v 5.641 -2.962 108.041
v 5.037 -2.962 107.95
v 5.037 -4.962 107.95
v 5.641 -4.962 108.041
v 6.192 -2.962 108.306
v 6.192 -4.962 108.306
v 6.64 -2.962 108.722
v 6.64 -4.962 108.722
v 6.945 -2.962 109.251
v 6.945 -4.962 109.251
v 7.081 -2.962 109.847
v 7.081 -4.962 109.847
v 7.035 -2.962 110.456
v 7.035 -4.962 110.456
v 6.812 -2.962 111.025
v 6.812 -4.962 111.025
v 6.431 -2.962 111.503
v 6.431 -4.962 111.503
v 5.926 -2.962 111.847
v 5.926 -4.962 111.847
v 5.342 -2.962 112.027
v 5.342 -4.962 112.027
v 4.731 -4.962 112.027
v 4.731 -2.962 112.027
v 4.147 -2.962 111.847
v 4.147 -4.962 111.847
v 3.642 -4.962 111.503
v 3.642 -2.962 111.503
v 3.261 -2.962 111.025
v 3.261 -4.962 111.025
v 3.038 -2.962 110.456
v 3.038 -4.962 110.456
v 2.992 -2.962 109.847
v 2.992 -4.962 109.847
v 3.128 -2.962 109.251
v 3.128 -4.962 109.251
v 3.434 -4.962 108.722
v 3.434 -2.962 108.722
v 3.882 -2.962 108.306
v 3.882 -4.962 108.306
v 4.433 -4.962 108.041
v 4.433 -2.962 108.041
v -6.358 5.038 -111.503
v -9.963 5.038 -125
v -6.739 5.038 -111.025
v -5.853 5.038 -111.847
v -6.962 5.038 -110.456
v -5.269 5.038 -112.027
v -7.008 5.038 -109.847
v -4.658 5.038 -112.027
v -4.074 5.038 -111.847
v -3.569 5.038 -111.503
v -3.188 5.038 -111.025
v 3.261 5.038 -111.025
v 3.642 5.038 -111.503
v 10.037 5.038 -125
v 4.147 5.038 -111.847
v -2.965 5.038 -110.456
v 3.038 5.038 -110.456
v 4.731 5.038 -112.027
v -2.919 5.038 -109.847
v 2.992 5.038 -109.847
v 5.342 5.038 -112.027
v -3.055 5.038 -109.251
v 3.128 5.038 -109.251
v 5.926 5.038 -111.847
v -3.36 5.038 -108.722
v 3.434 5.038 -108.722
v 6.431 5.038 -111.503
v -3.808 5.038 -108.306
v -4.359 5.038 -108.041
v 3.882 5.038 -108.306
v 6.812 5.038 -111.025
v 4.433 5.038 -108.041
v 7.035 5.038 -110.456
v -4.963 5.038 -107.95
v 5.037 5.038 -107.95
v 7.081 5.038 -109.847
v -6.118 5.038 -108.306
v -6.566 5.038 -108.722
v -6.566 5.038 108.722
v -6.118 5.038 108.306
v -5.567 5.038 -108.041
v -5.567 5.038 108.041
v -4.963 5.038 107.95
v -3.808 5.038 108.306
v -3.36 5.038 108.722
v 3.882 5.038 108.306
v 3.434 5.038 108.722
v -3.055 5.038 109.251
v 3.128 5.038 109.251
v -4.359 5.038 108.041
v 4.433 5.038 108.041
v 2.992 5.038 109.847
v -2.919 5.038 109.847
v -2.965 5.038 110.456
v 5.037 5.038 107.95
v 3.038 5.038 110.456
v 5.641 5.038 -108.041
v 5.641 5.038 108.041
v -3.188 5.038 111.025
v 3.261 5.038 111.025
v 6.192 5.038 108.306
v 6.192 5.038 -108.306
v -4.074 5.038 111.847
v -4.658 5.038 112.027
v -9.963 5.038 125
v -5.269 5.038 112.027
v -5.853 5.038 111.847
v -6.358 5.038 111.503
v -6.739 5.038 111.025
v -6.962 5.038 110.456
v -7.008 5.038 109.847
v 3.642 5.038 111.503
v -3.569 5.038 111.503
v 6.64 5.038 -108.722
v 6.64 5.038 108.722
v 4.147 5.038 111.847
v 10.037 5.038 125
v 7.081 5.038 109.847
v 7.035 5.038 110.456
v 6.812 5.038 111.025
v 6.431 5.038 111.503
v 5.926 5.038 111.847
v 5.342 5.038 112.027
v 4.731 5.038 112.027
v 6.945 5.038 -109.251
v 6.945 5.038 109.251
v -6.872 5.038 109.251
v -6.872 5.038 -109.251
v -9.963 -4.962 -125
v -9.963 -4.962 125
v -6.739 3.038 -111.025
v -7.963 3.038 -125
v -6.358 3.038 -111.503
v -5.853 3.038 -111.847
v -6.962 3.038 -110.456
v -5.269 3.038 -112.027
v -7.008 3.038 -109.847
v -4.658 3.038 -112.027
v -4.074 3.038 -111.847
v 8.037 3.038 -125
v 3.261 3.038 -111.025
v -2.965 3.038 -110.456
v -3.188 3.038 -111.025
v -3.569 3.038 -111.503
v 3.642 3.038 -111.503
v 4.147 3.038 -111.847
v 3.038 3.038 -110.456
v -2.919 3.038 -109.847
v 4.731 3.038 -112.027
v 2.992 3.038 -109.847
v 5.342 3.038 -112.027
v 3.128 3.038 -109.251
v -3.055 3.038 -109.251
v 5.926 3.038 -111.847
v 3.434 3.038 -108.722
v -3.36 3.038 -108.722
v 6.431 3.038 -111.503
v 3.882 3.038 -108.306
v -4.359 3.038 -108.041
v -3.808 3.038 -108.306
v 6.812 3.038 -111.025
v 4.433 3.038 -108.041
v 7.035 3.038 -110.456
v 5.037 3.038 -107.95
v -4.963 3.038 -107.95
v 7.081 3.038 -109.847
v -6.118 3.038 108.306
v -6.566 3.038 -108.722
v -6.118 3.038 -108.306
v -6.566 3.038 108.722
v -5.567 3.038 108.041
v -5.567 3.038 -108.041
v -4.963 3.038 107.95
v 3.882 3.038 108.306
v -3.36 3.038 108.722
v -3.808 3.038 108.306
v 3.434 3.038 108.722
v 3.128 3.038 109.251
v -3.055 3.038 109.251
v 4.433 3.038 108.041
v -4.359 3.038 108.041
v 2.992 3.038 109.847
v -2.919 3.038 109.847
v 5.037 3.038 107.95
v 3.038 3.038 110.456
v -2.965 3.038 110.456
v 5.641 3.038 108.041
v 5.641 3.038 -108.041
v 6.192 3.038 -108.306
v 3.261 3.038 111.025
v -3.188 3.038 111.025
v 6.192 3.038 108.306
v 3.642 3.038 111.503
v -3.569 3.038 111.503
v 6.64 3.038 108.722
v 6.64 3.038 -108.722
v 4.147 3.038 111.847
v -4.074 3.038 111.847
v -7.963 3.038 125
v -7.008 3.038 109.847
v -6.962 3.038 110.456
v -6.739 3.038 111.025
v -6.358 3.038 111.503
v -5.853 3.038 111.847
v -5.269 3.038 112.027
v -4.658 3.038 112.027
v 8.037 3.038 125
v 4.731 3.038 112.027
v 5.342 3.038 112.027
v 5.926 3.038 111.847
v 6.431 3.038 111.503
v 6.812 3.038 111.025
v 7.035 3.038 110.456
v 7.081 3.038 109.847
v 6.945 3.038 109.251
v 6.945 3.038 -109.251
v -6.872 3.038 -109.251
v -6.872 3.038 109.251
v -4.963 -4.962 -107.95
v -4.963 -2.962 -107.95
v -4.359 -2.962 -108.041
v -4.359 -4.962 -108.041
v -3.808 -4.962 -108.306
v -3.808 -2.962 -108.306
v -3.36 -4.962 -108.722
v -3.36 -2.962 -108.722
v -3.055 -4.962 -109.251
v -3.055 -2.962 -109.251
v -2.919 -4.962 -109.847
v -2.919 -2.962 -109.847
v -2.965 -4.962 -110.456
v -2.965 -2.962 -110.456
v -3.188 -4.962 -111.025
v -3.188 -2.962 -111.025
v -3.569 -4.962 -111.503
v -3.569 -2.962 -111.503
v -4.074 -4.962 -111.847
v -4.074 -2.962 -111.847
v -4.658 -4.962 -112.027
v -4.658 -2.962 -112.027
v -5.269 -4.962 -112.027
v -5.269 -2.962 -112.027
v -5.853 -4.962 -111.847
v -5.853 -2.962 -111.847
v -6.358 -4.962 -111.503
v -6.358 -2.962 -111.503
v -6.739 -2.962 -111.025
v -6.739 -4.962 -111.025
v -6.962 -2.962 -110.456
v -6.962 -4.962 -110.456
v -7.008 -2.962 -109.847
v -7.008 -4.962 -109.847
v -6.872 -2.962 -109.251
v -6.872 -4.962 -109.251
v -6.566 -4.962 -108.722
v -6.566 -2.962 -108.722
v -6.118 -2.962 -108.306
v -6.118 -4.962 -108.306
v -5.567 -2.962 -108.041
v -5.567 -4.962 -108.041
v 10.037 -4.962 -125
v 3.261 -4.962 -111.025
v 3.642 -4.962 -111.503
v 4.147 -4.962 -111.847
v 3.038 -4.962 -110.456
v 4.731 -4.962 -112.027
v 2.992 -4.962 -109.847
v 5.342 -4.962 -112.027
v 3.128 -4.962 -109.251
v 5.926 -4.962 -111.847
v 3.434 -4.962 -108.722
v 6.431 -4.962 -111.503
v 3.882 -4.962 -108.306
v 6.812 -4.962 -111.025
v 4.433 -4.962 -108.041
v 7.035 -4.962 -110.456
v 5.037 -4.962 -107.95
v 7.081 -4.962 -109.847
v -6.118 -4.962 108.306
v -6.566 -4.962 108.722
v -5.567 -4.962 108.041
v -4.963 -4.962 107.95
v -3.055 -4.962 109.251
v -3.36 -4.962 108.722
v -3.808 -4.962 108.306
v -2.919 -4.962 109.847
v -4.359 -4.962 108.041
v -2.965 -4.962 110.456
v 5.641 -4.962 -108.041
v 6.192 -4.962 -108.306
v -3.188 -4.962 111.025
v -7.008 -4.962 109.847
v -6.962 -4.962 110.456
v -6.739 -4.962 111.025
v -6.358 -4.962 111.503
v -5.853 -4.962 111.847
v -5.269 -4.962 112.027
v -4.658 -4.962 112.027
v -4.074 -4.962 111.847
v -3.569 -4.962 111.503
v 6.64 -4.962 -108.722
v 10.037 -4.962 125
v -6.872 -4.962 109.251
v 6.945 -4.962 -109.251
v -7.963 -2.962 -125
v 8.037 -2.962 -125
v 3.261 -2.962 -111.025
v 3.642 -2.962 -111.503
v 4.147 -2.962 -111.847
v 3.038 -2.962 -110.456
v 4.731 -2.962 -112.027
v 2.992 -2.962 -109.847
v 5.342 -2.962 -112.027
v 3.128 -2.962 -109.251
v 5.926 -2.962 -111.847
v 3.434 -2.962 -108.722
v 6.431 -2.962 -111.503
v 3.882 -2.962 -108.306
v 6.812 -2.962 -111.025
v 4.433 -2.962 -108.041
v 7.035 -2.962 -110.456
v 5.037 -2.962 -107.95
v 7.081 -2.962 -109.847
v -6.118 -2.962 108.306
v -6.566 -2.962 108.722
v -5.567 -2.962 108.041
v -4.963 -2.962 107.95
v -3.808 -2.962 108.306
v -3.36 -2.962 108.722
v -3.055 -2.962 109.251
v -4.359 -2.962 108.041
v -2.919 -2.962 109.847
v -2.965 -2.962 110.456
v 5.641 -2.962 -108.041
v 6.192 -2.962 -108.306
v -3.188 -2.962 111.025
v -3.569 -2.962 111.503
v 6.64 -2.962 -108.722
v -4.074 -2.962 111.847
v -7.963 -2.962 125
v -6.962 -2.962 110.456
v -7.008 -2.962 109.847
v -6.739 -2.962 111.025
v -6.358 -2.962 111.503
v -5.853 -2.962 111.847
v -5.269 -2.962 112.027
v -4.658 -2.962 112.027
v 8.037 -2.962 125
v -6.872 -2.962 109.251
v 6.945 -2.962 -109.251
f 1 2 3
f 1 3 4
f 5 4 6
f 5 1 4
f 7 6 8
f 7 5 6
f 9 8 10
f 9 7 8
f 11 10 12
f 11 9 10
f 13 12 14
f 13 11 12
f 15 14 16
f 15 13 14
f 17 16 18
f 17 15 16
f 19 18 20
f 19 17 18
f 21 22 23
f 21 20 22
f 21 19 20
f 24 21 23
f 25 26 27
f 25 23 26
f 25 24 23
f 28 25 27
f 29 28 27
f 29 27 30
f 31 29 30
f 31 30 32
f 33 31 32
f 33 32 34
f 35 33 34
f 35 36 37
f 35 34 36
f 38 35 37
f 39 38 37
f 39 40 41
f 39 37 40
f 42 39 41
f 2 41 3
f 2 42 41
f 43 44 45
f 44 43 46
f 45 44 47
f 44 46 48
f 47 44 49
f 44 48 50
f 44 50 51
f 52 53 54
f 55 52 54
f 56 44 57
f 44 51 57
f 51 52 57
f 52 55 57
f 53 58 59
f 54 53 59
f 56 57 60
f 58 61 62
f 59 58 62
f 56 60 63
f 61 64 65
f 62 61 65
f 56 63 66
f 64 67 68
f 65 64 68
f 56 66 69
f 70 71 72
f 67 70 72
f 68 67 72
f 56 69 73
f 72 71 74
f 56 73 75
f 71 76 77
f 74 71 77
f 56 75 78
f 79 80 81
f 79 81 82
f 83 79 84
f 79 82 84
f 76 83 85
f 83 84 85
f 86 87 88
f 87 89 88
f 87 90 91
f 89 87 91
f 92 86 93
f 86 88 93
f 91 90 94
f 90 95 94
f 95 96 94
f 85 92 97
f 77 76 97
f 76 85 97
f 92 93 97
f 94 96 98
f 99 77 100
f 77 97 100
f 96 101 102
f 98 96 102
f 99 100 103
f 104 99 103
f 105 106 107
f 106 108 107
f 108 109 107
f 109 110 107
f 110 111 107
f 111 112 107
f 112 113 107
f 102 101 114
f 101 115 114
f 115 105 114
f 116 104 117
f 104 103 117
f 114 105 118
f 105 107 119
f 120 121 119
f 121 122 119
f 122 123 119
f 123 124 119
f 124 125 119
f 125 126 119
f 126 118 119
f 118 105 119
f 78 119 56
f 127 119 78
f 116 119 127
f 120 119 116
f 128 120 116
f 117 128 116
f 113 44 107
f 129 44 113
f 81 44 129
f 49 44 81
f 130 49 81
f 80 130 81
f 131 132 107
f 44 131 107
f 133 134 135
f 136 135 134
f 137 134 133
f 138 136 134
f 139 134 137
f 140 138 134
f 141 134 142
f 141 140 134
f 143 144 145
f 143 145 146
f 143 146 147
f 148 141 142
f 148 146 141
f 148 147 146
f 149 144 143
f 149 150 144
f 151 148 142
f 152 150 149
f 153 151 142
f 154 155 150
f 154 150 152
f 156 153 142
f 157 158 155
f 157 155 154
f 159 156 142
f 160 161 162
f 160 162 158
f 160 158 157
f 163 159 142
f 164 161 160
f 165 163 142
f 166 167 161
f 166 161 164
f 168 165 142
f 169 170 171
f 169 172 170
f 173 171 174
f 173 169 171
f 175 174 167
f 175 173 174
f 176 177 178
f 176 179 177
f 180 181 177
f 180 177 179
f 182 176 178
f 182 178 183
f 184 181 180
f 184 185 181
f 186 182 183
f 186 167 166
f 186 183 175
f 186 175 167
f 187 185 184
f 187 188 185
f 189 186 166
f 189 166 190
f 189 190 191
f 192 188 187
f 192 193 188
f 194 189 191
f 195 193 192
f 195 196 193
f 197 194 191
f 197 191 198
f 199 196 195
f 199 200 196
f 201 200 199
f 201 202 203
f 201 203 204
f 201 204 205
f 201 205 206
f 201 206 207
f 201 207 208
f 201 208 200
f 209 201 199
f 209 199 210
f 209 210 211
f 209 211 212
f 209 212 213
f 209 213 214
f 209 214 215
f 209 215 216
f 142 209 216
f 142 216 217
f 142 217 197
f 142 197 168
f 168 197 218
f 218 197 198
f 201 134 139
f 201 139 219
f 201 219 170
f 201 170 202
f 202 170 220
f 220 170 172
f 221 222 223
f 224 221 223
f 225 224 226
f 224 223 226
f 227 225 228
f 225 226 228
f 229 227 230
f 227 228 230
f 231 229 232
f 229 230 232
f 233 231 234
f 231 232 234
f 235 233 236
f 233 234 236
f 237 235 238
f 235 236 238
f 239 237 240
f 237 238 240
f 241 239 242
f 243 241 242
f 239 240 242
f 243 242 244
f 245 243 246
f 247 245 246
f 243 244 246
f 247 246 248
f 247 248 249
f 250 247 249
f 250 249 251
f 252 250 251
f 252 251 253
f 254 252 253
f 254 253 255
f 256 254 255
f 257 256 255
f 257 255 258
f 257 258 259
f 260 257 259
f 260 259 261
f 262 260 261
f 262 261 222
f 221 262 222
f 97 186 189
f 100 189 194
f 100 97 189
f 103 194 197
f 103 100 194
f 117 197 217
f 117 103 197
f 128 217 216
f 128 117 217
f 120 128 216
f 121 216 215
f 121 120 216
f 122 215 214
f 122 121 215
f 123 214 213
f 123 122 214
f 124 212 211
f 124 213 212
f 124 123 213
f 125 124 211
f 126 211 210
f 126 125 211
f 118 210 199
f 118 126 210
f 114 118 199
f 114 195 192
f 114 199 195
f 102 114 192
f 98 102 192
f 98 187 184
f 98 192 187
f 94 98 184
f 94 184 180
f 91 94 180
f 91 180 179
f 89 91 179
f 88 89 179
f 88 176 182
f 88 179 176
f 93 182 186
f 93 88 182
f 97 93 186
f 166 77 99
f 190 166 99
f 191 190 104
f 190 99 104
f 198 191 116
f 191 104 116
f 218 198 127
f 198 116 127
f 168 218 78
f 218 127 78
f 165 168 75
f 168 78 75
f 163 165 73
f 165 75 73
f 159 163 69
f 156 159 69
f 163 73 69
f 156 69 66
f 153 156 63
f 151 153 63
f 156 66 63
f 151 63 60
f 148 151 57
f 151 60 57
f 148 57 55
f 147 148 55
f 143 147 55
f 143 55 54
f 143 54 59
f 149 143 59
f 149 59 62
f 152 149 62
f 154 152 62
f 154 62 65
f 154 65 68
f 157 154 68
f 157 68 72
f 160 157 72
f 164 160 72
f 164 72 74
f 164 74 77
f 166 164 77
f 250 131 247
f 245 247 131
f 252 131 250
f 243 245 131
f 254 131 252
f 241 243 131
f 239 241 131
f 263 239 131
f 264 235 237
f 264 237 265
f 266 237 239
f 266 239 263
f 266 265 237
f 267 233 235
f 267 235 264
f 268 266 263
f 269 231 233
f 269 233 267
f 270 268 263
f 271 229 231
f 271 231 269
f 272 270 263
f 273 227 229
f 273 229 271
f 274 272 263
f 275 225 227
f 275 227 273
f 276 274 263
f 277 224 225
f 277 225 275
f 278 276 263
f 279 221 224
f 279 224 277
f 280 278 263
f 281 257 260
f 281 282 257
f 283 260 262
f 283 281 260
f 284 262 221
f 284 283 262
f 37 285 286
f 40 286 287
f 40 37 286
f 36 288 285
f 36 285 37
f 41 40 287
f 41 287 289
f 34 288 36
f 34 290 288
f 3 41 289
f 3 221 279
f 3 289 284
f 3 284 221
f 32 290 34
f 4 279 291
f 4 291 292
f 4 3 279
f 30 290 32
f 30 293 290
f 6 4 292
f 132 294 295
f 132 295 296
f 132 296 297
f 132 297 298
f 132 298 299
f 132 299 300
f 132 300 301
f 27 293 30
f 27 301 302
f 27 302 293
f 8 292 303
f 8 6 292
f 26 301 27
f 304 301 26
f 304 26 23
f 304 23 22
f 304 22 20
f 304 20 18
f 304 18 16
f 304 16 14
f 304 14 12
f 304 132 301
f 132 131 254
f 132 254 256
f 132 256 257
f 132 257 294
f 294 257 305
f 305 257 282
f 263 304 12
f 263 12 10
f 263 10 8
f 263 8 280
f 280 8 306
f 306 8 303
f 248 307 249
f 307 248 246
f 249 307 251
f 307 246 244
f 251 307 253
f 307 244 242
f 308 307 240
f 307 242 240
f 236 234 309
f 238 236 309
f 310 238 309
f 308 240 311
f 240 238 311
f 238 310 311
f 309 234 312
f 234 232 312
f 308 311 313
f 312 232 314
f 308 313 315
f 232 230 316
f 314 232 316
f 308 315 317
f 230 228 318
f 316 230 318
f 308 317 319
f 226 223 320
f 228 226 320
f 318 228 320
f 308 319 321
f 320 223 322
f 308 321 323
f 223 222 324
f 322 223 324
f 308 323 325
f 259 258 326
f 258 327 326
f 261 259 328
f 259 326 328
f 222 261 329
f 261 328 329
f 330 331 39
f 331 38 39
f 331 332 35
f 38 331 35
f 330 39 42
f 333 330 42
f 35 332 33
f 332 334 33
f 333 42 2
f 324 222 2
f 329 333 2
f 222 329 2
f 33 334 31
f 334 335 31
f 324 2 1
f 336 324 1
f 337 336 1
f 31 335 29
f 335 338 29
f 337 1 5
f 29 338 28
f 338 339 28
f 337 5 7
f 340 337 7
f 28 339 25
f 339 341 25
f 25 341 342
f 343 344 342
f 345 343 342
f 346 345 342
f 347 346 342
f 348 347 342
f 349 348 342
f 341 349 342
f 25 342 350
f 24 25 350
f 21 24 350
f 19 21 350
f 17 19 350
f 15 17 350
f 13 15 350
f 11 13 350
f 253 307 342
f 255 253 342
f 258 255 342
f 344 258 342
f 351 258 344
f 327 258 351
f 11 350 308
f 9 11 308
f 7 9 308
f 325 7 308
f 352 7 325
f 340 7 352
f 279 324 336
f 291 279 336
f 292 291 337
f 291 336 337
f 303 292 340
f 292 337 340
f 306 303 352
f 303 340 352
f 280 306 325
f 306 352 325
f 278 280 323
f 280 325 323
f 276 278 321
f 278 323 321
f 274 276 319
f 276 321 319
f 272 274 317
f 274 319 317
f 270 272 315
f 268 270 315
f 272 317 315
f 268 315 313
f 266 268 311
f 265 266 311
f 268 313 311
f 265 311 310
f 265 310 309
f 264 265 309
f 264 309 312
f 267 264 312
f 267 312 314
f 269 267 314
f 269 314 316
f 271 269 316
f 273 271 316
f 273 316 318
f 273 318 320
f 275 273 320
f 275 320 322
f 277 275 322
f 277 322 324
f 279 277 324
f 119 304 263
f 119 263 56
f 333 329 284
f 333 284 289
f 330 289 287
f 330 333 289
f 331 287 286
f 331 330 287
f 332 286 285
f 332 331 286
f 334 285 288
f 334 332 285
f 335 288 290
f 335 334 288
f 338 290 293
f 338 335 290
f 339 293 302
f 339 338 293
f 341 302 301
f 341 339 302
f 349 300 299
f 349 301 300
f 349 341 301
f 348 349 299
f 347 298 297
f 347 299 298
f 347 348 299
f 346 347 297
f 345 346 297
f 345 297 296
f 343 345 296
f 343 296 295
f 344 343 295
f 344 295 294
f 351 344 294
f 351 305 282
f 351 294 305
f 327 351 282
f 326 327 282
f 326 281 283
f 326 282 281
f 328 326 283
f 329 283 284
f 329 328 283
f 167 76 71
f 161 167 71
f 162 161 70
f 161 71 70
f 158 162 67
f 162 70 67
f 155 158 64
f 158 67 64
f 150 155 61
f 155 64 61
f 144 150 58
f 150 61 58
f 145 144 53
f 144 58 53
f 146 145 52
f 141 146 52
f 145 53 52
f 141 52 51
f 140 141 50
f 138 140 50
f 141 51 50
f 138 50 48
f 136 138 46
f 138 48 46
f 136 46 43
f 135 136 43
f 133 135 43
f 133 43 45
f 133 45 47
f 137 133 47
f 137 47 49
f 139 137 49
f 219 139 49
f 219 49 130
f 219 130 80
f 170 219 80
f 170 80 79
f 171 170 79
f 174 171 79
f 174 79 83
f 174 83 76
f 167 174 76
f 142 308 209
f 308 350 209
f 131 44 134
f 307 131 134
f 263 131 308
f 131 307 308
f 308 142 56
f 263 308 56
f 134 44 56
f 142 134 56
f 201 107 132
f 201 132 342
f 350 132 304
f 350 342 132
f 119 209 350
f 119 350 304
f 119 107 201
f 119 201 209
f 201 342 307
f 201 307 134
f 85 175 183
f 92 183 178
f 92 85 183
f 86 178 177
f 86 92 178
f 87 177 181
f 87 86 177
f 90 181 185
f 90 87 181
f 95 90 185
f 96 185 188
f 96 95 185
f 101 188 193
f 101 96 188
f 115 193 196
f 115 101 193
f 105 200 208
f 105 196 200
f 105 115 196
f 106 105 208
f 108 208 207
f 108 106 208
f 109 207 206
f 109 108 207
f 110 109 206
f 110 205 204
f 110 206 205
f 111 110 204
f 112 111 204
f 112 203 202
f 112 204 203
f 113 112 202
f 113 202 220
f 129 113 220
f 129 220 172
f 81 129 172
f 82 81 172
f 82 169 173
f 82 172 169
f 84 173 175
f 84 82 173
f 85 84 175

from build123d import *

# Parameters (mm, degrees)
SKETCH_1_W          = 20
SKETCH_1_H          = 10
SKETCH_1_W_2        = 16
SKETCH_1_H_2        = 6
EXTRUDE_1_DEPTH     = 125
SKETCH_3_R          = 2.05
CUT_EXTRUDE_1_DEPTH = 126.800383248


with BuildPart() as part:
    # 草图1 → 凸台-拉伸1 (new, symmetric)
    with BuildSketch(Plane.XY):
        with Locations((0.036753729, 0.03823935)):
            Rectangle(SKETCH_1_W, SKETCH_1_H)
        with Locations((0.036753729, 0.03823935)):
            Rectangle(SKETCH_1_W_2, SKETCH_1_H_2, mode=Mode.SUBTRACT)
    extrude(amount=EXTRUDE_1_DEPTH, both=True)

    # 草图3 → 切除-拉伸1 (cut, through all)
    with BuildSketch(Plane(origin=(0, 5.03823935, 0), x_dir=(1, 0, 0), z_dir=(0, 1, 0))):
        with Locations(Location((-4.963246271, 110, 0), (0, 0, 270))):
            Circle(SKETCH_3_R)
        with Locations(Location((5.036753729, 110, 0), (0, 0, 270))):
            Circle(SKETCH_3_R)
    cut_extrude_1 = extrude(amount=-CUT_EXTRUDE_1_DEPTH, mode=Mode.SUBTRACT)

    # 镜向1: 切除-拉伸1 across plane
    add(cut_extrude_1.mirror(Plane.XY), mode=Mode.SUBTRACT)


solid = part.part
